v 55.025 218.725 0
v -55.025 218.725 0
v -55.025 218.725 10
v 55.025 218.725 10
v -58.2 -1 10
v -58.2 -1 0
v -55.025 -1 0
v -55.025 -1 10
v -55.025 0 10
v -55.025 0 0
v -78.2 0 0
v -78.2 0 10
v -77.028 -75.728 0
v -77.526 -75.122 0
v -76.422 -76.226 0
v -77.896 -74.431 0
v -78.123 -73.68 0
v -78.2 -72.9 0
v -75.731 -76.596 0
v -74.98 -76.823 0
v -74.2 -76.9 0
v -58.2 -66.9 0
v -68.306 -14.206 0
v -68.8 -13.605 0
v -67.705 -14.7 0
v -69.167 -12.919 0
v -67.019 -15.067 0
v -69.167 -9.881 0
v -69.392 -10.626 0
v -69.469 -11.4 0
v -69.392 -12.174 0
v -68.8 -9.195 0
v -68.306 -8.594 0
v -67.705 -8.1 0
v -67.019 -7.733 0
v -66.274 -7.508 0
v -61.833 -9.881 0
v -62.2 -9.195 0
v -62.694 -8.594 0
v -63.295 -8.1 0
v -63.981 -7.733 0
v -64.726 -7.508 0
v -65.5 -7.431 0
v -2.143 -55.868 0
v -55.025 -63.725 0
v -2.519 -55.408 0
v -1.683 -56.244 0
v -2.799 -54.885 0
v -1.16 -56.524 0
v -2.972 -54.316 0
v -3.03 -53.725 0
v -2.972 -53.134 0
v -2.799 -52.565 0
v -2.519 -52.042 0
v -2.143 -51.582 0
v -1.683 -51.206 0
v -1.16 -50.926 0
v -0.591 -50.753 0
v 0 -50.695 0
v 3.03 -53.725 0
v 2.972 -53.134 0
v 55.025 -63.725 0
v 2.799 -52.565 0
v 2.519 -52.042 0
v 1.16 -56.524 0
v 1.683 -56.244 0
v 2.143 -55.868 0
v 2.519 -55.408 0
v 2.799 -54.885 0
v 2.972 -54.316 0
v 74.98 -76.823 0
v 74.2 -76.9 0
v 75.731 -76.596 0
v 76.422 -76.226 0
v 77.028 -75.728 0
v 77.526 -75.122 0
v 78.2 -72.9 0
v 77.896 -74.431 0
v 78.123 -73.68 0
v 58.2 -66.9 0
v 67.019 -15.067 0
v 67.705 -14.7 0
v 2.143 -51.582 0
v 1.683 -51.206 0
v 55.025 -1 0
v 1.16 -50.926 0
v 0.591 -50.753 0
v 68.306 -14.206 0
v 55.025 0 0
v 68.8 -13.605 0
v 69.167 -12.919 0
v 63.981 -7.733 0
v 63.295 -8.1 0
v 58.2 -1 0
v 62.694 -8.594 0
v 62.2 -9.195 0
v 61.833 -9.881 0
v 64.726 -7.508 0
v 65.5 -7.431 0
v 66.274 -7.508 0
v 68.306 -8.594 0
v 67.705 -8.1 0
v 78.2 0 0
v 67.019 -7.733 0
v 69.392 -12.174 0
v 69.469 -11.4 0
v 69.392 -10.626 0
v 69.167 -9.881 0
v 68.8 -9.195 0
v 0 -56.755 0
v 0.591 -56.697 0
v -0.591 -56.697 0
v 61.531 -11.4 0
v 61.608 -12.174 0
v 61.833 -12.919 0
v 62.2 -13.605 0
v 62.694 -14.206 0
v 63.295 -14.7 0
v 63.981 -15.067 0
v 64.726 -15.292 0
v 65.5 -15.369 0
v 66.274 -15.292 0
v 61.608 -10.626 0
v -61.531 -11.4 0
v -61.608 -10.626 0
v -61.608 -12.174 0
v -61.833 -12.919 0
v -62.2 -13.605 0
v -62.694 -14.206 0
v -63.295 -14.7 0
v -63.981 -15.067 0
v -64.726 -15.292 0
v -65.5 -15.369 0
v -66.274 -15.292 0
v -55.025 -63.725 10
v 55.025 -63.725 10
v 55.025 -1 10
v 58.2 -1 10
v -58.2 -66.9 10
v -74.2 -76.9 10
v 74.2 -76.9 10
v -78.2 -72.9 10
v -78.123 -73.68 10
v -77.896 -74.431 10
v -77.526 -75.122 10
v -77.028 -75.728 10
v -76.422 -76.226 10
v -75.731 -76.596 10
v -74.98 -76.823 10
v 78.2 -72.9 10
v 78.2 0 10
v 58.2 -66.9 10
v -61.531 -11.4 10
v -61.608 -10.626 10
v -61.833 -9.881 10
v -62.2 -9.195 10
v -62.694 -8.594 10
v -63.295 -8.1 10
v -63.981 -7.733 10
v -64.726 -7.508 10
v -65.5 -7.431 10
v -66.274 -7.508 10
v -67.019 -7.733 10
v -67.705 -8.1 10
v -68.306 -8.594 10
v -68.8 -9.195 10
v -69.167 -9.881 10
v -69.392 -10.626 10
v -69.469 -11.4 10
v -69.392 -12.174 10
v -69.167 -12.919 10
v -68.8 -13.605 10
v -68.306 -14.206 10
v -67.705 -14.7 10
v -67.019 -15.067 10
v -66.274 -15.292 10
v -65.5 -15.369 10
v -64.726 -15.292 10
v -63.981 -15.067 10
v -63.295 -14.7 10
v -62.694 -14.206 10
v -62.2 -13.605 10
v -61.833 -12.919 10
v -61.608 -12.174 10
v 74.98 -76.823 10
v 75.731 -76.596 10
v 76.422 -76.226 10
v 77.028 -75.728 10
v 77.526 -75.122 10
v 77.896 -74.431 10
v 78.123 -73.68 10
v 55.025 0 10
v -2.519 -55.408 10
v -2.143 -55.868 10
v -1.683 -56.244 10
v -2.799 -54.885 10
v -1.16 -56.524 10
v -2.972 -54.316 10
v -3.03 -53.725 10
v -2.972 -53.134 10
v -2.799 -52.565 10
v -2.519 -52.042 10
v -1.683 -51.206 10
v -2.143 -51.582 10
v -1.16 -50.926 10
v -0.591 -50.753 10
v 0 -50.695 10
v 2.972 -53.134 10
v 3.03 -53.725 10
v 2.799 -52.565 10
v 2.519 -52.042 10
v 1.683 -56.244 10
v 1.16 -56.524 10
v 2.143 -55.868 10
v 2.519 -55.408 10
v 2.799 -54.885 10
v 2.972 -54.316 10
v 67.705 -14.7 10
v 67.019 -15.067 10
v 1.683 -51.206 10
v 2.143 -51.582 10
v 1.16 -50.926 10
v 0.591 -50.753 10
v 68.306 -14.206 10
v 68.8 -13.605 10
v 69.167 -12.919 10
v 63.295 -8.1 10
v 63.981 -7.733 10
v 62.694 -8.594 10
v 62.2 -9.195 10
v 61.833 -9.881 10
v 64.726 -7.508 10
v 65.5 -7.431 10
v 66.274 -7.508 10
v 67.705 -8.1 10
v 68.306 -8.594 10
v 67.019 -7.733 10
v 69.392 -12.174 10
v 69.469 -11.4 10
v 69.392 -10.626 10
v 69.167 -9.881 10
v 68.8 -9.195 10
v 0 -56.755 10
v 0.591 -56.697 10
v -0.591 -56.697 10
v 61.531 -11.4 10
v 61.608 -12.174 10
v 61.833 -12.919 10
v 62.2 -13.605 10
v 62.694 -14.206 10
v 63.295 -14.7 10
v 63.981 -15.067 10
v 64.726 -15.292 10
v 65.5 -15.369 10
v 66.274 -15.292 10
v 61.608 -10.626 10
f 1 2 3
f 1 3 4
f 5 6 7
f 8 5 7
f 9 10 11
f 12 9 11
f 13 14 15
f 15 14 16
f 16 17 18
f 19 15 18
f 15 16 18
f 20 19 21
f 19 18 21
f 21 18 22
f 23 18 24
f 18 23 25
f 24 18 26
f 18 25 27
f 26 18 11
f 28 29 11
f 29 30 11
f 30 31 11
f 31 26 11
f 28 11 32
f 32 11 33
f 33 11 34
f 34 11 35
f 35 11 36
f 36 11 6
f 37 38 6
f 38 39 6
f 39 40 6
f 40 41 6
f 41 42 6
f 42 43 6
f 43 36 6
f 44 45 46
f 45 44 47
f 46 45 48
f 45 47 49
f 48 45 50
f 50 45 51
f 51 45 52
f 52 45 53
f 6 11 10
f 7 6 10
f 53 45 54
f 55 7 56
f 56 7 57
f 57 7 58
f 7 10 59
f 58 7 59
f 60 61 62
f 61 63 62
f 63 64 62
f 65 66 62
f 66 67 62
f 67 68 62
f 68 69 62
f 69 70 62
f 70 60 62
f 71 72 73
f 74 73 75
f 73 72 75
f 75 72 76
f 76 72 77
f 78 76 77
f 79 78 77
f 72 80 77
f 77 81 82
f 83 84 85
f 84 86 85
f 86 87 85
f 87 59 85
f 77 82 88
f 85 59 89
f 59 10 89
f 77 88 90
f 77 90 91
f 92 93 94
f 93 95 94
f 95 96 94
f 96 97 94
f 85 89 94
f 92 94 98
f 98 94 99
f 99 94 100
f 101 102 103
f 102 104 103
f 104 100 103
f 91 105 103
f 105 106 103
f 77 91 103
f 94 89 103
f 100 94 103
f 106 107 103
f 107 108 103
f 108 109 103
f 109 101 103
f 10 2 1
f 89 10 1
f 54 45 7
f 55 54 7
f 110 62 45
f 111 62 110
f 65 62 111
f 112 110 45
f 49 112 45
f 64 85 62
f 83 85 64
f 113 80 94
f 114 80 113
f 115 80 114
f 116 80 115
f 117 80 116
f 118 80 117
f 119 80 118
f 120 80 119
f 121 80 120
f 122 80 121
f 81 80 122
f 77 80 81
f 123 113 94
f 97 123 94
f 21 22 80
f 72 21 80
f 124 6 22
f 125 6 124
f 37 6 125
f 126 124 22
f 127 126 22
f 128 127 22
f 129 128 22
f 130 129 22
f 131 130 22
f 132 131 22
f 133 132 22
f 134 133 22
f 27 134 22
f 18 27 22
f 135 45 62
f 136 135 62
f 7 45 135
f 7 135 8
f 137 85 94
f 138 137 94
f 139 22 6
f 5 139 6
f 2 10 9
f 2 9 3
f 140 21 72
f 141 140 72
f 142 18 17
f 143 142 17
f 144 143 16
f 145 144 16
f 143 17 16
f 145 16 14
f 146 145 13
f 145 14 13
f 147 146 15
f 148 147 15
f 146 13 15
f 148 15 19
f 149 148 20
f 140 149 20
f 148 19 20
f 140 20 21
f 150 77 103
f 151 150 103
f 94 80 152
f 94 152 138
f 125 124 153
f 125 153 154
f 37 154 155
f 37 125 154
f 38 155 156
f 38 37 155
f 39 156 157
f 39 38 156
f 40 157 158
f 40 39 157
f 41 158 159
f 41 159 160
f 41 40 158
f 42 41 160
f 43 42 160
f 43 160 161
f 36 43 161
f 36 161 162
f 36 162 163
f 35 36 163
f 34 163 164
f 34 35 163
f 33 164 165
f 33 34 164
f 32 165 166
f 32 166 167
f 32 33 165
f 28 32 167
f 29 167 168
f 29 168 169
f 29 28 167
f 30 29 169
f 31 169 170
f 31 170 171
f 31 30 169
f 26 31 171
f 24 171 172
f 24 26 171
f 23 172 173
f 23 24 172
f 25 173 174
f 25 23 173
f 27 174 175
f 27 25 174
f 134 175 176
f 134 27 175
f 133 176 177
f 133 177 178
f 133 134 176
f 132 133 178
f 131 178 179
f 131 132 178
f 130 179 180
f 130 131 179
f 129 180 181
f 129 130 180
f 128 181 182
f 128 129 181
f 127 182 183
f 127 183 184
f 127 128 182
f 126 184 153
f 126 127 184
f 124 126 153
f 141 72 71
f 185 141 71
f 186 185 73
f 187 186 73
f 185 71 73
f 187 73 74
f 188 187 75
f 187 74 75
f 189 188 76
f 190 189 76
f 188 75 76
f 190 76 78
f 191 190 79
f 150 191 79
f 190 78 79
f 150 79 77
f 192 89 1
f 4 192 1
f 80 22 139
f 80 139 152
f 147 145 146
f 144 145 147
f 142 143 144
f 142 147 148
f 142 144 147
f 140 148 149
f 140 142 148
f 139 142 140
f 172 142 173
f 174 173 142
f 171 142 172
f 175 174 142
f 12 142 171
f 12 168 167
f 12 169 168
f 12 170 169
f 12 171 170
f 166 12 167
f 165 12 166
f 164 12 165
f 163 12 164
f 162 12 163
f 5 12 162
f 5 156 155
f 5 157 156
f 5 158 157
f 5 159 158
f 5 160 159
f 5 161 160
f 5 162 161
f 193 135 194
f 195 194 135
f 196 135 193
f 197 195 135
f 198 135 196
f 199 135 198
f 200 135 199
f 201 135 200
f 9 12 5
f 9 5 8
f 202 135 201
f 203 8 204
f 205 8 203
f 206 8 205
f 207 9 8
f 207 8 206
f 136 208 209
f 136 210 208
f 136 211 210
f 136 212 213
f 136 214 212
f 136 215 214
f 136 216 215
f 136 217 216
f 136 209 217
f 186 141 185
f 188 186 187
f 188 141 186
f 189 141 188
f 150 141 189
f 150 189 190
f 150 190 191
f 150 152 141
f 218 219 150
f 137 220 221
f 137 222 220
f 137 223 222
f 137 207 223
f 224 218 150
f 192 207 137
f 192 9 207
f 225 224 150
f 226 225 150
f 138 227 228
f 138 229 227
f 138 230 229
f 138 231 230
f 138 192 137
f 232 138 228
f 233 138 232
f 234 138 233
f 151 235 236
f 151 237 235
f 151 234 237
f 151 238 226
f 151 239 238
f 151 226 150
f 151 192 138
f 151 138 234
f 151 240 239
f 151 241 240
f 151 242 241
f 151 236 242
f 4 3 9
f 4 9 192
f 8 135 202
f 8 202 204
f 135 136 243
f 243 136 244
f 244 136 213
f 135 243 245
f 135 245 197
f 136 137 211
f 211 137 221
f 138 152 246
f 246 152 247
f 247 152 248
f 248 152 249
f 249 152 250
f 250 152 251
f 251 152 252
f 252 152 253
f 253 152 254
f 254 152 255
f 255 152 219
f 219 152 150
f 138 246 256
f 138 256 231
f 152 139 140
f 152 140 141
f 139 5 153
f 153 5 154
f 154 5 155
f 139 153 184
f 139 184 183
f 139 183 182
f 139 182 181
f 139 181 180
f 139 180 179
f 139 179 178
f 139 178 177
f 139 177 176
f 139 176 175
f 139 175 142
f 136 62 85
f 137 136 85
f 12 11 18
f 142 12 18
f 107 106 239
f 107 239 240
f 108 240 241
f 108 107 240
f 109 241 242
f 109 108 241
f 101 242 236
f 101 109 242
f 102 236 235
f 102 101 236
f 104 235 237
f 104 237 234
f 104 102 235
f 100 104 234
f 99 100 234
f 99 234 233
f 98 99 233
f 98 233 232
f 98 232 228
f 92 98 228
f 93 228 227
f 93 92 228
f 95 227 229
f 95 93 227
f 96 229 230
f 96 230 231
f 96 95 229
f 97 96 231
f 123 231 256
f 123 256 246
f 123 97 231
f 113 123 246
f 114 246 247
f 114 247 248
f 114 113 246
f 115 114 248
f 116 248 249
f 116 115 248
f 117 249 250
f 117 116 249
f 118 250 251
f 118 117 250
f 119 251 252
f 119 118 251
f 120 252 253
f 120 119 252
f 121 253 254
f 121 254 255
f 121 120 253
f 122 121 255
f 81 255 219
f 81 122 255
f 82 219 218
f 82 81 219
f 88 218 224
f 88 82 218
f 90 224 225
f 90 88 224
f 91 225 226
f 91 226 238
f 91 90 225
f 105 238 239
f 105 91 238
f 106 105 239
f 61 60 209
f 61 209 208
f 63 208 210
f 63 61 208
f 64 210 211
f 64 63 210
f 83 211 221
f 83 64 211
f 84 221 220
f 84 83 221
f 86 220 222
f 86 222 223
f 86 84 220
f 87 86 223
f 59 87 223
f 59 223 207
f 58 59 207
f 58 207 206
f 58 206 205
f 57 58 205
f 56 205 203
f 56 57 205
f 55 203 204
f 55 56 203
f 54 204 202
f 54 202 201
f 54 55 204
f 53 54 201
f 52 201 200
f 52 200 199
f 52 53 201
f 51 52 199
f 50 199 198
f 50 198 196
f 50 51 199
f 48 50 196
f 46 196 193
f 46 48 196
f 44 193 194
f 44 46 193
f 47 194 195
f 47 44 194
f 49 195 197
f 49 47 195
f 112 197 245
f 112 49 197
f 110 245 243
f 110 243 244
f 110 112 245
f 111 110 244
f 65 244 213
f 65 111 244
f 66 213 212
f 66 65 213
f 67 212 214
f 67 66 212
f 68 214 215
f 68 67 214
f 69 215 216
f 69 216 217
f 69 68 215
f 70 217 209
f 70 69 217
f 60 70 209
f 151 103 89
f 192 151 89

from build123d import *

# Parameters (mm, degrees)
SKETCH_R       = 3.96875
SKETCH_W       = 116.4
SKETCH_H       = 65.9
PAD_DEPTH      = 10
BOX_W          = 110.05
BOX_H          = 282.45
BOX_DEPTH      = 10
CYLINDER_R     = 3.03
CYLINDER_DEPTH = 10


with BuildPart() as part:
    # Sketch → Pad (new body)
    with BuildSketch(Plane.XY):
        with BuildLine():
            Line((78.2, 0), (-78.2, 0))
            Line((-78.2, 0), (-78.2, -72.9))
            ThreePointArc((-78.2, -72.9), (-77.028427, -75.728427), (-74.2, -76.9))
            Line((-74.2, -76.9), (74.2, -76.9))
            ThreePointArc((74.2, -76.9), (77.028427, -75.728427), (78.2, -72.9))
            Line((78.2, -72.9), (78.2, 0))
        make_face()
        with Locations((-65.5, -11.4)):
            Circle(SKETCH_R, mode=Mode.SUBTRACT)
        with Locations((65.5, -11.4)):
            Circle(SKETCH_R, mode=Mode.SUBTRACT)
        with Locations((0, -33.95)):
            Rectangle(SKETCH_W, SKETCH_H, mode=Mode.SUBTRACT)
    extrude(amount=PAD_DEPTH)

    # Box → Box (join)
    with BuildSketch(Plane(origin=(-55.025, -63.725, 0), x_dir=(1, 0, 0), z_dir=(0, 0, 1))):
        with Locations((55.025, 141.225)):
            Rectangle(BOX_W, BOX_H)
    extrude(amount=BOX_DEPTH)

    # Cylinder → Cylinder (cut)
    with BuildSketch(Plane(origin=(0, -53.725, 0), x_dir=(1, 0, 0), z_dir=(0, 0, 1))):
        Circle(CYLINDER_R)
    extrude(amount=CYLINDER_DEPTH, mode=Mode.SUBTRACT)


solid = part.part
